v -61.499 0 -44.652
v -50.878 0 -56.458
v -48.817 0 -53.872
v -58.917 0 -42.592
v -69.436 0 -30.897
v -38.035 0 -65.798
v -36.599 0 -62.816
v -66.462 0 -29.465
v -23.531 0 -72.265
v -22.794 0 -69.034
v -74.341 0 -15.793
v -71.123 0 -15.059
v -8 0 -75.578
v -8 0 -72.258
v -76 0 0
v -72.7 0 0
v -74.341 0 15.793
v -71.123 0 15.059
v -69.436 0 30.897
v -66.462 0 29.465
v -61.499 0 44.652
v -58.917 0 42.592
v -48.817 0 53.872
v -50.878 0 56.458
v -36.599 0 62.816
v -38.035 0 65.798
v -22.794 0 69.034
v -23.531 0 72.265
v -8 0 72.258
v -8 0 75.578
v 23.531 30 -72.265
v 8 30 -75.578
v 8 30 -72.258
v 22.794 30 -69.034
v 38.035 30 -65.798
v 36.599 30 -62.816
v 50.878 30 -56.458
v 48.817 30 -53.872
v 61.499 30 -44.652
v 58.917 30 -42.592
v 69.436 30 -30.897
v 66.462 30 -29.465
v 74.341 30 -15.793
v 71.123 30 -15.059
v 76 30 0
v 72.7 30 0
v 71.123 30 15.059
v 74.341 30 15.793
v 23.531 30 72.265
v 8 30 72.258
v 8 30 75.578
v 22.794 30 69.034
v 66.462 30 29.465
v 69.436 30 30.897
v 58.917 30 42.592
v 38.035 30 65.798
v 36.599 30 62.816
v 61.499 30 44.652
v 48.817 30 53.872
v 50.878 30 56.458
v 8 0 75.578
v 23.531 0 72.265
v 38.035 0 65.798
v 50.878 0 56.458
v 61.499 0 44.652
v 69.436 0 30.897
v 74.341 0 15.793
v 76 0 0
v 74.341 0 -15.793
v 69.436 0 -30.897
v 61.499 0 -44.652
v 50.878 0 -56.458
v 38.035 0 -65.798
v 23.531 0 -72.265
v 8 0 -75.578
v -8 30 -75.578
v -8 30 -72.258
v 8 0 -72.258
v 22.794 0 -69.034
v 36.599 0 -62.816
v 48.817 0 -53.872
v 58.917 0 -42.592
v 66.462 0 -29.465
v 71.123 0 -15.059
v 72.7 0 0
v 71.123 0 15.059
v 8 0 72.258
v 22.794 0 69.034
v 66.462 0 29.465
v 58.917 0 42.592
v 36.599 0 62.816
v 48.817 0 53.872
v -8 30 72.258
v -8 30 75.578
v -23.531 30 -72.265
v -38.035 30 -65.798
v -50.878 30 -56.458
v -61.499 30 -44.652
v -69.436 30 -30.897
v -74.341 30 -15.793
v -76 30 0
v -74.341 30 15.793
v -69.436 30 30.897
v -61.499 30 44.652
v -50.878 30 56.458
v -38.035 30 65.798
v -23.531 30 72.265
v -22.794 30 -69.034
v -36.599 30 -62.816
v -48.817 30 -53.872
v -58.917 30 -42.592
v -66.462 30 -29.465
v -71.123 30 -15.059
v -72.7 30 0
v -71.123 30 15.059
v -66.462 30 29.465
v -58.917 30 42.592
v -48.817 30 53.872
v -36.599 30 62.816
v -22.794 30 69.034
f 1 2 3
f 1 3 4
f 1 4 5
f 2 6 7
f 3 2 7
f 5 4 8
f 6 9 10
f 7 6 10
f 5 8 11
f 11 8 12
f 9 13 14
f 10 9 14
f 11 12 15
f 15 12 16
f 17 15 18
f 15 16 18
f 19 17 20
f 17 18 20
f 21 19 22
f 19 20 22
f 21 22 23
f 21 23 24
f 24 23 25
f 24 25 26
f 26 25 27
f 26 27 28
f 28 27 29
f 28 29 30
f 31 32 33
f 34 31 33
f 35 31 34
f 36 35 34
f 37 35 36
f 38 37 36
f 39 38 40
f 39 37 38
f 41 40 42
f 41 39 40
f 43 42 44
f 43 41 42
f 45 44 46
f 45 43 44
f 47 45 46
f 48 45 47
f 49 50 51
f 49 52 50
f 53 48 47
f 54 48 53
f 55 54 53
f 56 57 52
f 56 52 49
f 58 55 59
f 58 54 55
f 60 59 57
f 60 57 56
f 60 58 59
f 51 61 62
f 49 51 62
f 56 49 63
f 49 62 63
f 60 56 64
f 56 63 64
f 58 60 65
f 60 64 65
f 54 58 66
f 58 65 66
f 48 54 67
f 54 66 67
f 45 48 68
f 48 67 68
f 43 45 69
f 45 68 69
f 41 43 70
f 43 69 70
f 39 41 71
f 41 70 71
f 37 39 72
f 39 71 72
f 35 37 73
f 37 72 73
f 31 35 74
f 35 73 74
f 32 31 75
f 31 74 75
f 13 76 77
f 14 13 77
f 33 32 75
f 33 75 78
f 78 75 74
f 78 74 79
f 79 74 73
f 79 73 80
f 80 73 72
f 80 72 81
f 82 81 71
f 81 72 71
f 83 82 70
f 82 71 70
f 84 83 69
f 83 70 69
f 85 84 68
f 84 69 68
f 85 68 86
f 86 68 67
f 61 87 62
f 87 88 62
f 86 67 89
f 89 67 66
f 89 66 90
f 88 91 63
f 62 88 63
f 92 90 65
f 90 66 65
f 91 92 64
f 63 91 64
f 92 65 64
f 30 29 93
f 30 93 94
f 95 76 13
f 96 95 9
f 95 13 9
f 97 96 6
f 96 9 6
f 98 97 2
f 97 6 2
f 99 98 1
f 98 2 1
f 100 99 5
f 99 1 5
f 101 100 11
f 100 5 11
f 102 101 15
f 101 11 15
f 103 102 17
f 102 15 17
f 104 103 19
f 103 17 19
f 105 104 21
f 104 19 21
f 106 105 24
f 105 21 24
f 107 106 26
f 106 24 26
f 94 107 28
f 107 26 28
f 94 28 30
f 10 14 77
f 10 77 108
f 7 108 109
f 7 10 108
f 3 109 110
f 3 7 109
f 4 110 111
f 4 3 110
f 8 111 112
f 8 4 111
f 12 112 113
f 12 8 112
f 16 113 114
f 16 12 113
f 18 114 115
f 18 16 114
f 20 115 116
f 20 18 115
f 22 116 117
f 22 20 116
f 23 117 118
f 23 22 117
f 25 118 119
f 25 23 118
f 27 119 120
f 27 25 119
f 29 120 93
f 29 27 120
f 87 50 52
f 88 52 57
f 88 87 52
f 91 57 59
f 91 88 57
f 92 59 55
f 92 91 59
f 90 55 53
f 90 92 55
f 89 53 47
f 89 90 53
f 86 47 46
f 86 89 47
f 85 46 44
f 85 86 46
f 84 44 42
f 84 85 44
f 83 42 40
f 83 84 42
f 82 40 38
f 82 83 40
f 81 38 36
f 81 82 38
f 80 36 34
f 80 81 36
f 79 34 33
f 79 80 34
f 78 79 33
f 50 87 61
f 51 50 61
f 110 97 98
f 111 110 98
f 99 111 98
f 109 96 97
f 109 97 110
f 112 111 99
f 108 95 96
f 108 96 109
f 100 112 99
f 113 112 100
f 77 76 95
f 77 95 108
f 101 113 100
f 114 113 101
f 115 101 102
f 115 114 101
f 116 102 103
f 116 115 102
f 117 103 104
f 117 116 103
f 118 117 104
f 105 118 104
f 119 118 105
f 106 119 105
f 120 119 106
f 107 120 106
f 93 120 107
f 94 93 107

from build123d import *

# Parameters (mm, degrees)
ESQUISSE1_R             = 76
ESQUISSE1_R_2           = 72.7
BOSS_EXTRU_1_DEPTH      = 30
ESQUISSE2_W             = 16
ESQUISSE2_H             = 207.49820715
ENL_V_MAT_EXTRU_1_DEPTH = 112.588529877


with BuildPart() as part:
    # Esquisse1 → Boss.-Extru.1 (new body)
    with BuildSketch(Plane(origin=(0, 0, 0), x_dir=(1, 0, 0), z_dir=(0, 1, 0))):
        with Locations(Location((0, 0, 0), (0, 0, 270))):
            Circle(ESQUISSE1_R)
        with Locations(Location((0, 0, 0), (0, 0, 270))):
            Circle(ESQUISSE1_R_2, mode=Mode.SUBTRACT)
    extrude(amount=BOSS_EXTRU_1_DEPTH)

    # Esquisse2 → Enlèv. mat.-Extru.1 (cut, through all)
    with BuildSketch(Plane.XZ):
        with Locations((0, 22.122568389)):
            Rectangle(ESQUISSE2_W, ESQUISSE2_H)
    extrude(amount=-ENL_V_MAT_EXTRU_1_DEPTH, mode=Mode.SUBTRACT)


with BuildPart() as enl_v_mat_extru_1_piece_1:
    # of the separate pieces the step leaves, piece 1, a body of its own (enl_v_mat_extru_1_pieces)
    add(part.part.solids().sort_by_distance((8, 0, 75.577774511))[0])


with BuildPart() as enl_v_mat_extru_1_piece_2:
    # of the separate pieces the step leaves, piece 2, a body of its own (enl_v_mat_extru_1_pieces)
    add(part.part.solids().sort_by_distance((-8, 0, -75.577774511))[0])


solid = Compound([enl_v_mat_extru_1_piece_1.part, enl_v_mat_extru_1_piece_2.part])
